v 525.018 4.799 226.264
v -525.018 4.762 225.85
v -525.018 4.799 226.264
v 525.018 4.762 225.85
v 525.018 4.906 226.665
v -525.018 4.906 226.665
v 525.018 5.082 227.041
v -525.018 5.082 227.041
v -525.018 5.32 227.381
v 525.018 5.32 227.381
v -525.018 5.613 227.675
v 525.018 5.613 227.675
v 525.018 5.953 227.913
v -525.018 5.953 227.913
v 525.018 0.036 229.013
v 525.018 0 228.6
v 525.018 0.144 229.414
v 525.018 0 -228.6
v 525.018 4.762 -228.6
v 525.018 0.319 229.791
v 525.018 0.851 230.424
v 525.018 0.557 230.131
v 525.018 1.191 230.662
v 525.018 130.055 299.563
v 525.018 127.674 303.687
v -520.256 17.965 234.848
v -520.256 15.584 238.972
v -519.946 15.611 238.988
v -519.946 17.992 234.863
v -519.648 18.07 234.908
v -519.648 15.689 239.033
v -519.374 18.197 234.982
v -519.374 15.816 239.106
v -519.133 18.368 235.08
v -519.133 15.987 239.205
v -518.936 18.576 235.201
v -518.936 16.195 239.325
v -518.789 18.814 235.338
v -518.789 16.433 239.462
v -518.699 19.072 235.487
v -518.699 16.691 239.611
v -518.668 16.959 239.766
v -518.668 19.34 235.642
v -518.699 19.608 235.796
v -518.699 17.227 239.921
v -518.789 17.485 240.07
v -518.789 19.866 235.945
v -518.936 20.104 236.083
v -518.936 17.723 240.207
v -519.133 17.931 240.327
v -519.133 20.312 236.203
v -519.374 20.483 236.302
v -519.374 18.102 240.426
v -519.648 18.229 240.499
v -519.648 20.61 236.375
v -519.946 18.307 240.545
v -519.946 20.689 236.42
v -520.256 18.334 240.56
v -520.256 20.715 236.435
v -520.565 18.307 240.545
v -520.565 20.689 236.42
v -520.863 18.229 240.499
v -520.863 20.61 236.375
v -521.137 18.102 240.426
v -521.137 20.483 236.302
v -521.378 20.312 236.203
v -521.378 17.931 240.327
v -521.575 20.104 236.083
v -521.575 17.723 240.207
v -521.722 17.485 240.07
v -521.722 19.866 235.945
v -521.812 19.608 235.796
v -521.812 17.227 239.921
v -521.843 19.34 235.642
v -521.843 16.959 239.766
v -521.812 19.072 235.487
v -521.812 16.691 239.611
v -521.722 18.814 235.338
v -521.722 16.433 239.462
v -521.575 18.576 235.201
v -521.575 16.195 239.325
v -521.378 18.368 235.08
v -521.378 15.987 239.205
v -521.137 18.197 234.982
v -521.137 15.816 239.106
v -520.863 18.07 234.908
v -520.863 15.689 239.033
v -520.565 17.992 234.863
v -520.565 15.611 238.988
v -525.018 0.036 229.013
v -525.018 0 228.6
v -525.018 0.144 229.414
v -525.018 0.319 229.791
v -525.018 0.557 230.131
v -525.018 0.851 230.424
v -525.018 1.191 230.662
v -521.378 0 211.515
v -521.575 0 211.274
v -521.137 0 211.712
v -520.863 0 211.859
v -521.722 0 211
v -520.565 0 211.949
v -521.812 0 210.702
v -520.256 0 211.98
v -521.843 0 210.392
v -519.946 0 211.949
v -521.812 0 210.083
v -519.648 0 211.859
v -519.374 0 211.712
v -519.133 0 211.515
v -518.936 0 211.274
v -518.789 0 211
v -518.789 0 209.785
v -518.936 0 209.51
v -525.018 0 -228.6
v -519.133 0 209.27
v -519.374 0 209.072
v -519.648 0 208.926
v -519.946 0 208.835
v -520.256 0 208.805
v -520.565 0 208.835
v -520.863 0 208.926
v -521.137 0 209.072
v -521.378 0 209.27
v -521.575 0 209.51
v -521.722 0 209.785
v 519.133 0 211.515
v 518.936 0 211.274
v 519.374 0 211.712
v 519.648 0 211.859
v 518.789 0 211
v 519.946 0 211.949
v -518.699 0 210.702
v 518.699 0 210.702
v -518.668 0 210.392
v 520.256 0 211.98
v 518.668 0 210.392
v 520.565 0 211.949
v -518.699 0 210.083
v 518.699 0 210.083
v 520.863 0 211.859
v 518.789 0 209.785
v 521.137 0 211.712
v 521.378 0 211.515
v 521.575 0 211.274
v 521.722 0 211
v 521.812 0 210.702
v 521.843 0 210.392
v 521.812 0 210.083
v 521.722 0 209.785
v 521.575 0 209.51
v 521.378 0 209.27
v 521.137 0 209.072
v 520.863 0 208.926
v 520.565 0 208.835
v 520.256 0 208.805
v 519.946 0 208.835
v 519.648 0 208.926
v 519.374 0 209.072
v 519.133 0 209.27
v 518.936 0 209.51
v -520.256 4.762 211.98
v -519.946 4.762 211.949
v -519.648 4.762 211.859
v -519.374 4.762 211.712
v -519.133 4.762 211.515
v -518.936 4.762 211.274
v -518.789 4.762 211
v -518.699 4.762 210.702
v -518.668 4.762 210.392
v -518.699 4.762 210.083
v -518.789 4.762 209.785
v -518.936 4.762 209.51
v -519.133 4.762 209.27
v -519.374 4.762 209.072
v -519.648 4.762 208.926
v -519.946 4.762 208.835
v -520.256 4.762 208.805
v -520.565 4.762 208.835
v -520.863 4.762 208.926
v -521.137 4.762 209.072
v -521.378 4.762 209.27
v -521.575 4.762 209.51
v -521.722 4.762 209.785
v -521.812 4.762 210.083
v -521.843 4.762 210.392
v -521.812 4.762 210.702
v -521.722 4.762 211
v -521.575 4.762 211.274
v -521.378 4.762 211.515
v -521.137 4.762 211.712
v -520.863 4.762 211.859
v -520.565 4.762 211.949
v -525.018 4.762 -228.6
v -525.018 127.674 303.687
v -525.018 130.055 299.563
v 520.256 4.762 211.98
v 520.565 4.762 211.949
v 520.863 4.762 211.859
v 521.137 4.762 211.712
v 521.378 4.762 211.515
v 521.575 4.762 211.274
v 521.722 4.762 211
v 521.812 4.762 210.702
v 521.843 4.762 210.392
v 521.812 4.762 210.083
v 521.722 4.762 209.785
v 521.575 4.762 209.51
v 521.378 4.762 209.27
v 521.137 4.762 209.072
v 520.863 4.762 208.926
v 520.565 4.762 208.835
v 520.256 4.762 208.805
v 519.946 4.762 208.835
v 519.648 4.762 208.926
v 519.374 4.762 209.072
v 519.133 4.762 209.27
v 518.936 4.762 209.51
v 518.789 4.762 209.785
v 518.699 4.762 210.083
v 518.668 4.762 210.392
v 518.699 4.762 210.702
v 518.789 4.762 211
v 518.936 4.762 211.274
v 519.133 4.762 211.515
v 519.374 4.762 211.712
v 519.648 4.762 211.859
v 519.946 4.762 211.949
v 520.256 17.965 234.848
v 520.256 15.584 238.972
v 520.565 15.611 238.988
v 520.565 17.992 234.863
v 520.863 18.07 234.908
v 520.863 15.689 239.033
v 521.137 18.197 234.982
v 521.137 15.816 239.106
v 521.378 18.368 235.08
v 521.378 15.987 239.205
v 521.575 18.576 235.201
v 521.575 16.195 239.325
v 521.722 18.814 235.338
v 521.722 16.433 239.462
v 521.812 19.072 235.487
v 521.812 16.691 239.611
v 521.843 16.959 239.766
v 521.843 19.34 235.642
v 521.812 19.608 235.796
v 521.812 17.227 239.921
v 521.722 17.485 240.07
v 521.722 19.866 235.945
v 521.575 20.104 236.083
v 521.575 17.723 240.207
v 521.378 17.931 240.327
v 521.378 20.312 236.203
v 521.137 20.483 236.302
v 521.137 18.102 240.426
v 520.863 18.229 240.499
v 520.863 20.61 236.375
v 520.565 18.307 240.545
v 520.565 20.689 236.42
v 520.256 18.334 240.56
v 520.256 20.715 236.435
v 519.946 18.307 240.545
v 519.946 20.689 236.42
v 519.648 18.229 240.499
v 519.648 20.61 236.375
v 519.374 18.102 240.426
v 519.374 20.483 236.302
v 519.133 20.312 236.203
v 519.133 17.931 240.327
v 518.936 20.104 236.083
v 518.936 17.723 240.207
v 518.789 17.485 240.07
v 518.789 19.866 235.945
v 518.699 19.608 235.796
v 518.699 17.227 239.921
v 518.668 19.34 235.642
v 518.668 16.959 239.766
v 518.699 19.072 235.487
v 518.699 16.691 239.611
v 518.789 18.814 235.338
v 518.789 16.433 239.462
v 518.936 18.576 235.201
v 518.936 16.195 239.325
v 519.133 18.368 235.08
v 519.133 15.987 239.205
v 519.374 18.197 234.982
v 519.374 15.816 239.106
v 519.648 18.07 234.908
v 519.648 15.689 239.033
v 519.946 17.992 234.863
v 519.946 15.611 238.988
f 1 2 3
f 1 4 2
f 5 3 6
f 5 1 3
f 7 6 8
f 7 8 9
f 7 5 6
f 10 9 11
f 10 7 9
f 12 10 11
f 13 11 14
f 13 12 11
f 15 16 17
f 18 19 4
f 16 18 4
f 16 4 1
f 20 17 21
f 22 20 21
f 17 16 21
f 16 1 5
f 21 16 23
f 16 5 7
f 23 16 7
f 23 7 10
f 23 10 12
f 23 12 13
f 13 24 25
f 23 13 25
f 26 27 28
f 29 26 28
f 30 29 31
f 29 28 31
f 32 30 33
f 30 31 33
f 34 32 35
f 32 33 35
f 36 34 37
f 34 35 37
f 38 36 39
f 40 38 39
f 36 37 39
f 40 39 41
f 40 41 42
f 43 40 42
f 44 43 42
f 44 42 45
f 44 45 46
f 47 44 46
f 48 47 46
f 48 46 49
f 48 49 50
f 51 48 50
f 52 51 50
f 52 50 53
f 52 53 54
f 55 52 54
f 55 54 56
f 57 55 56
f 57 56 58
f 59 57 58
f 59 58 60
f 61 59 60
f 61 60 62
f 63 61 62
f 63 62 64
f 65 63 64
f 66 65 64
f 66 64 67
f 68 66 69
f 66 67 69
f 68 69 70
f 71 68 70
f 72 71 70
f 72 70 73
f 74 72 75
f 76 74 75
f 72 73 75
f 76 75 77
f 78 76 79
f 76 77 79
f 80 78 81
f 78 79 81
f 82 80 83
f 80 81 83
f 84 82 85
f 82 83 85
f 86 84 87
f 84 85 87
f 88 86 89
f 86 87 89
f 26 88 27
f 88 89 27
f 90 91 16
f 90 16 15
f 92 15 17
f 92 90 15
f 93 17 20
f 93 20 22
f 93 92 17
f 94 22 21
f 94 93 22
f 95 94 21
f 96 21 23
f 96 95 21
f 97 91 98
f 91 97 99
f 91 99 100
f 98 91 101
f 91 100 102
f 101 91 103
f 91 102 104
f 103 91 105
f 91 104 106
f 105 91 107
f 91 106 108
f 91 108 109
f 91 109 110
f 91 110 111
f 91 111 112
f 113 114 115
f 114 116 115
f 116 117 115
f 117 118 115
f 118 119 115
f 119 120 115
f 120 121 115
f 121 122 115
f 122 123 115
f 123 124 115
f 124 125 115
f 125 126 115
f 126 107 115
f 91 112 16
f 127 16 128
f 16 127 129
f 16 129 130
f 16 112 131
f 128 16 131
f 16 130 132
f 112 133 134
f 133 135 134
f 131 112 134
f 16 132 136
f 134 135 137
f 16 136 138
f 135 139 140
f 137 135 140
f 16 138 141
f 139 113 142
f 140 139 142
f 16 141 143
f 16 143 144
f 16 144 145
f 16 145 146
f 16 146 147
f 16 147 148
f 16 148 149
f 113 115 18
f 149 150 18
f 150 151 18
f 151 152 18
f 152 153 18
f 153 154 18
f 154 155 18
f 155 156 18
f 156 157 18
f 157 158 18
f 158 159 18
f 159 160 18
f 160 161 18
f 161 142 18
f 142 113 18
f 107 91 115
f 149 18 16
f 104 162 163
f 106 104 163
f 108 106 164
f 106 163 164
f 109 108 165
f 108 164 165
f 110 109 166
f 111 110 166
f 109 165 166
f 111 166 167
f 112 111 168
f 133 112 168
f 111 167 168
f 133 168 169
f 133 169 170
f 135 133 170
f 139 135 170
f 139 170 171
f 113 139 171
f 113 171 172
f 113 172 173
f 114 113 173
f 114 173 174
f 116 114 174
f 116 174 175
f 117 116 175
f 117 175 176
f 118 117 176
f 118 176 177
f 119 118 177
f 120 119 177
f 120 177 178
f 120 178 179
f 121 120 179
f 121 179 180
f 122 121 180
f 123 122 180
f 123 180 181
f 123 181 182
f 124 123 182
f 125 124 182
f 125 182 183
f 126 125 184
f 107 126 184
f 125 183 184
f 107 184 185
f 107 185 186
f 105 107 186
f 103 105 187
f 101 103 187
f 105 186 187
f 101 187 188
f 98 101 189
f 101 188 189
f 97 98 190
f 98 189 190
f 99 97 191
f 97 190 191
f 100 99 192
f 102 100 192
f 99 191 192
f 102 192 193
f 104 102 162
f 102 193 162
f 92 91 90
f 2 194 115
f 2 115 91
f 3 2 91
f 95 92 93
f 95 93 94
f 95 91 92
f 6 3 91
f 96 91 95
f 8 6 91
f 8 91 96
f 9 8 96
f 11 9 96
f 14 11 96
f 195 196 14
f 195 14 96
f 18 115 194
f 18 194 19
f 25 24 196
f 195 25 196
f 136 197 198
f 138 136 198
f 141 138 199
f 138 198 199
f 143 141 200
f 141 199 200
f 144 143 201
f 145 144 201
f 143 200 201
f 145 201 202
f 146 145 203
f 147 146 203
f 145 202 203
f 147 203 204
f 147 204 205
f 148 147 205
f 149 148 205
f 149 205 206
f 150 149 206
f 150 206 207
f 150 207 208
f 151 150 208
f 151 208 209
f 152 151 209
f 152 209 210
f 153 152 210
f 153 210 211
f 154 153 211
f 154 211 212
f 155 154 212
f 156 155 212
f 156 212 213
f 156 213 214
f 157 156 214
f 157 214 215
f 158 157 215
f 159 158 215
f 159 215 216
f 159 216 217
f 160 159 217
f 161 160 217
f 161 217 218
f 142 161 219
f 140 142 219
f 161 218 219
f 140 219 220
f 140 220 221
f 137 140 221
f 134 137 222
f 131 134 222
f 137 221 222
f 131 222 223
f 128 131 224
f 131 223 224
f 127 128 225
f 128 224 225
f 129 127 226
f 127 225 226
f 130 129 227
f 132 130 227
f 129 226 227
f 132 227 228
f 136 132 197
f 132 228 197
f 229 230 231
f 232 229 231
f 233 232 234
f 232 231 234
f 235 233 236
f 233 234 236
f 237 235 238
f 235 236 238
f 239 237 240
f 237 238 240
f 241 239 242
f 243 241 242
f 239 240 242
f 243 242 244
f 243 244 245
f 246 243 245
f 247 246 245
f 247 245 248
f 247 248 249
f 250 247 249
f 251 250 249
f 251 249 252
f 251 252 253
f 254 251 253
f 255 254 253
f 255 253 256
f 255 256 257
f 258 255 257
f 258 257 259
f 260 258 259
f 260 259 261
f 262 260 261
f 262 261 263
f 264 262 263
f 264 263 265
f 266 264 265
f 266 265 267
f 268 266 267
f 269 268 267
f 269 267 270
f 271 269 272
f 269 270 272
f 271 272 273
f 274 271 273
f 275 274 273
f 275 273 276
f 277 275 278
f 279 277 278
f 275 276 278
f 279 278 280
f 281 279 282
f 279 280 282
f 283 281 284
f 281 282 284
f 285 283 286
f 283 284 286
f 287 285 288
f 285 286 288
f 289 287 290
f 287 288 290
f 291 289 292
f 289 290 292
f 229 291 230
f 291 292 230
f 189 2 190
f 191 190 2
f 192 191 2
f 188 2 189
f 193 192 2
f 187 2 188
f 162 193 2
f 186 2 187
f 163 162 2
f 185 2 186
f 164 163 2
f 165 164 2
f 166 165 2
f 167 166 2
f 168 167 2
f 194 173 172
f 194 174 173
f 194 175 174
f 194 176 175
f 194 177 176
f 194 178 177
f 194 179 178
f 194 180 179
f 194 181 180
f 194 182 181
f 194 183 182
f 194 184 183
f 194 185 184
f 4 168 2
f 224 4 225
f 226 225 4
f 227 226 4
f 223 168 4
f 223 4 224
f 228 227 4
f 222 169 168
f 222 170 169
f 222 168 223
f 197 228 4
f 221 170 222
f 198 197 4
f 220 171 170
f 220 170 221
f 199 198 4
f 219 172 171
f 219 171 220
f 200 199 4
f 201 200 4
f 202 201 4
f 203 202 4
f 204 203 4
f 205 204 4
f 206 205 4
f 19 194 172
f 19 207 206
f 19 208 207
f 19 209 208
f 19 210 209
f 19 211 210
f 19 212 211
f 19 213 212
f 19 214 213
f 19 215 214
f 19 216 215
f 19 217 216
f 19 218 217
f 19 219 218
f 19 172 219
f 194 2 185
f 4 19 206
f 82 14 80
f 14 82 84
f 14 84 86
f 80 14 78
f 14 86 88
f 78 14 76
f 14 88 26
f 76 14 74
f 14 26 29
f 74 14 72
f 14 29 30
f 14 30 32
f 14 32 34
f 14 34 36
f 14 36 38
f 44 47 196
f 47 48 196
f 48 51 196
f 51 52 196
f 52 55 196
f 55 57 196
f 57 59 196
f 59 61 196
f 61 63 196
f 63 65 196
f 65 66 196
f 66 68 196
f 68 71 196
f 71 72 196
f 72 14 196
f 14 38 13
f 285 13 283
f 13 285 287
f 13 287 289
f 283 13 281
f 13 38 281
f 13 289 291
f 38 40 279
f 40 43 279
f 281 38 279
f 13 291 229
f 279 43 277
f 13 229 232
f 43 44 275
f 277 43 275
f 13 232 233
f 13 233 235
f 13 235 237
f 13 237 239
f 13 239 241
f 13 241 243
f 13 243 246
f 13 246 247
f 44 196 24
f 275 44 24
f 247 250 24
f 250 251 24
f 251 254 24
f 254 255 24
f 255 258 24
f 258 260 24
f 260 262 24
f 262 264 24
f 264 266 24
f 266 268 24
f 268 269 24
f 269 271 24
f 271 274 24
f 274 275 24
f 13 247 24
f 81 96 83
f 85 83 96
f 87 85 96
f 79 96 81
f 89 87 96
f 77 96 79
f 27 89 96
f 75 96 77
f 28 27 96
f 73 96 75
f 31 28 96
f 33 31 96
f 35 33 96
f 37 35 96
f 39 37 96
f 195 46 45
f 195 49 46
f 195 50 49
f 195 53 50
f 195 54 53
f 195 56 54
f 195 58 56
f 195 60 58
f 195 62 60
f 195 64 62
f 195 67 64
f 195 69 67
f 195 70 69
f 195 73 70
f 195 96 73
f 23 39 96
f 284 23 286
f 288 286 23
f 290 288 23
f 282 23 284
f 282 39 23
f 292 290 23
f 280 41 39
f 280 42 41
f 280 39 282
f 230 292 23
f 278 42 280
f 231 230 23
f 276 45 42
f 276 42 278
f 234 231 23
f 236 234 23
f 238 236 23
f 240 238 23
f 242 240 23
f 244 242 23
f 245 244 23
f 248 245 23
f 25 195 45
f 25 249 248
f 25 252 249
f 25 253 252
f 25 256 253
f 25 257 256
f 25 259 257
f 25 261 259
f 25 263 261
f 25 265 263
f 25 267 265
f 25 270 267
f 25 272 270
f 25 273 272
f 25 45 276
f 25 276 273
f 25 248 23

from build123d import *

# Parameters (mm, degrees)
SKETCH1_W           = 1050.036
SKETCH1_H           = 457.2
BOSS_EXTRUDE1_DEPTH = 4.7625
BOSS_EXTRUDE2_DEPTH = 1050.036
SKETCH9_R           = 1.5875
CUT_EXTRUDE3_DEPTH  = 574.601708141
CIRPATTERN1_COUNT   = 2
CIRPATTERN1_ANGLE   = 120
CUT_EXTRUDE2_REACH  = 826.59
SKETCH8_W           = 1050.036
SKETCH8_H           = 311.15
FILLET1_R           = 2.38125


with BuildPart() as part:
    # Sketch1 → Boss-Extrude1 (new body)
    with BuildSketch(Plane(origin=(0, 0, 0), x_dir=(1, 0, 0), z_dir=(0, 1, 0))):
        Rectangle(SKETCH1_W, SKETCH1_H)
    boss_extrude1 = extrude(amount=BOSS_EXTRUDE1_DEPTH)

    # Sketch2 → Boss-Extrude2 (add)
    with BuildSketch(Plane.ZY.offset(525.018)):
        with BuildLine():
            Line((228.6, 4.7625), (228.6, 0))
            ThreePointArc((228.6, 0), (230.98125, 2.38125), (228.6, 4.7625))
        make_face()
    extrude(amount=-BOSS_EXTRUDE2_DEPTH)

    # Sketch9 → Cut-Extrude3 (cut, through all)
    with BuildSketch(Plane(origin=(0, 4.7625, 0), x_dir=(1, 0, 0), z_dir=(0, 1, 0))):
        with Locations(Location((520.2555, -210.3923148, 0), (0, 0, 270))):
            Circle(SKETCH9_R)
        with Locations(Location((-520.2555, -210.3923148, 0), (0, 0, 270))):
            Circle(SKETCH9_R)
    cut_extrude3 = extrude(amount=-CUT_EXTRUDE3_DEPTH, mode=Mode.SUBTRACT)

    # CirPattern1: Boss-Extrude1, Cut-Extrude3 ×2 about axis
    cirpattern1_axis = Axis((0, 2.38125, 228.6), (1, 0, 0))
    add([boss_extrude1.rotate(cirpattern1_axis, i * CIRPATTERN1_ANGLE / (CIRPATTERN1_COUNT - 1)) for i in range(1, CIRPATTERN1_COUNT)])
    add([cut_extrude3.rotate(cirpattern1_axis, i * CIRPATTERN1_ANGLE / (CIRPATTERN1_COUNT - 1)) for i in range(1, CIRPATTERN1_COUNT)], mode=Mode.SUBTRACT)

    # Sketch8 → Cut-Extrude2 (cut, up to next)
    with BuildSketch(Plane(origin=(0, -97.200766153, 168.356665511), x_dir=(-1, 0, 0), z_dir=(0, 0.500000000000004, -0.8660254037844365)), mode=Mode.PRIVATE) as cut_extrude2_sk1:
        with Locations((0, 417.987222993)):
            Rectangle(SKETCH8_W, SKETCH8_H)
    cut_extrude2_tool1 = extrude(cut_extrude2_sk1.sketch, amount=-CUT_EXTRUDE2_REACH, mode=Mode.PRIVATE) & part.part
    add(cut_extrude2_tool1.solids().sort_by_distance((0, 264.786787, 377.350277))[0], mode=Mode.SUBTRACT)

    # Fillet1
    fillet1_edges = [part.edges().sort_by_distance(p)[0] for p in [
        (0, 4.7625, 227.225184671),
    ]]
    fillet(fillet1_edges, radius=FILLET1_R)


solid = part.part
